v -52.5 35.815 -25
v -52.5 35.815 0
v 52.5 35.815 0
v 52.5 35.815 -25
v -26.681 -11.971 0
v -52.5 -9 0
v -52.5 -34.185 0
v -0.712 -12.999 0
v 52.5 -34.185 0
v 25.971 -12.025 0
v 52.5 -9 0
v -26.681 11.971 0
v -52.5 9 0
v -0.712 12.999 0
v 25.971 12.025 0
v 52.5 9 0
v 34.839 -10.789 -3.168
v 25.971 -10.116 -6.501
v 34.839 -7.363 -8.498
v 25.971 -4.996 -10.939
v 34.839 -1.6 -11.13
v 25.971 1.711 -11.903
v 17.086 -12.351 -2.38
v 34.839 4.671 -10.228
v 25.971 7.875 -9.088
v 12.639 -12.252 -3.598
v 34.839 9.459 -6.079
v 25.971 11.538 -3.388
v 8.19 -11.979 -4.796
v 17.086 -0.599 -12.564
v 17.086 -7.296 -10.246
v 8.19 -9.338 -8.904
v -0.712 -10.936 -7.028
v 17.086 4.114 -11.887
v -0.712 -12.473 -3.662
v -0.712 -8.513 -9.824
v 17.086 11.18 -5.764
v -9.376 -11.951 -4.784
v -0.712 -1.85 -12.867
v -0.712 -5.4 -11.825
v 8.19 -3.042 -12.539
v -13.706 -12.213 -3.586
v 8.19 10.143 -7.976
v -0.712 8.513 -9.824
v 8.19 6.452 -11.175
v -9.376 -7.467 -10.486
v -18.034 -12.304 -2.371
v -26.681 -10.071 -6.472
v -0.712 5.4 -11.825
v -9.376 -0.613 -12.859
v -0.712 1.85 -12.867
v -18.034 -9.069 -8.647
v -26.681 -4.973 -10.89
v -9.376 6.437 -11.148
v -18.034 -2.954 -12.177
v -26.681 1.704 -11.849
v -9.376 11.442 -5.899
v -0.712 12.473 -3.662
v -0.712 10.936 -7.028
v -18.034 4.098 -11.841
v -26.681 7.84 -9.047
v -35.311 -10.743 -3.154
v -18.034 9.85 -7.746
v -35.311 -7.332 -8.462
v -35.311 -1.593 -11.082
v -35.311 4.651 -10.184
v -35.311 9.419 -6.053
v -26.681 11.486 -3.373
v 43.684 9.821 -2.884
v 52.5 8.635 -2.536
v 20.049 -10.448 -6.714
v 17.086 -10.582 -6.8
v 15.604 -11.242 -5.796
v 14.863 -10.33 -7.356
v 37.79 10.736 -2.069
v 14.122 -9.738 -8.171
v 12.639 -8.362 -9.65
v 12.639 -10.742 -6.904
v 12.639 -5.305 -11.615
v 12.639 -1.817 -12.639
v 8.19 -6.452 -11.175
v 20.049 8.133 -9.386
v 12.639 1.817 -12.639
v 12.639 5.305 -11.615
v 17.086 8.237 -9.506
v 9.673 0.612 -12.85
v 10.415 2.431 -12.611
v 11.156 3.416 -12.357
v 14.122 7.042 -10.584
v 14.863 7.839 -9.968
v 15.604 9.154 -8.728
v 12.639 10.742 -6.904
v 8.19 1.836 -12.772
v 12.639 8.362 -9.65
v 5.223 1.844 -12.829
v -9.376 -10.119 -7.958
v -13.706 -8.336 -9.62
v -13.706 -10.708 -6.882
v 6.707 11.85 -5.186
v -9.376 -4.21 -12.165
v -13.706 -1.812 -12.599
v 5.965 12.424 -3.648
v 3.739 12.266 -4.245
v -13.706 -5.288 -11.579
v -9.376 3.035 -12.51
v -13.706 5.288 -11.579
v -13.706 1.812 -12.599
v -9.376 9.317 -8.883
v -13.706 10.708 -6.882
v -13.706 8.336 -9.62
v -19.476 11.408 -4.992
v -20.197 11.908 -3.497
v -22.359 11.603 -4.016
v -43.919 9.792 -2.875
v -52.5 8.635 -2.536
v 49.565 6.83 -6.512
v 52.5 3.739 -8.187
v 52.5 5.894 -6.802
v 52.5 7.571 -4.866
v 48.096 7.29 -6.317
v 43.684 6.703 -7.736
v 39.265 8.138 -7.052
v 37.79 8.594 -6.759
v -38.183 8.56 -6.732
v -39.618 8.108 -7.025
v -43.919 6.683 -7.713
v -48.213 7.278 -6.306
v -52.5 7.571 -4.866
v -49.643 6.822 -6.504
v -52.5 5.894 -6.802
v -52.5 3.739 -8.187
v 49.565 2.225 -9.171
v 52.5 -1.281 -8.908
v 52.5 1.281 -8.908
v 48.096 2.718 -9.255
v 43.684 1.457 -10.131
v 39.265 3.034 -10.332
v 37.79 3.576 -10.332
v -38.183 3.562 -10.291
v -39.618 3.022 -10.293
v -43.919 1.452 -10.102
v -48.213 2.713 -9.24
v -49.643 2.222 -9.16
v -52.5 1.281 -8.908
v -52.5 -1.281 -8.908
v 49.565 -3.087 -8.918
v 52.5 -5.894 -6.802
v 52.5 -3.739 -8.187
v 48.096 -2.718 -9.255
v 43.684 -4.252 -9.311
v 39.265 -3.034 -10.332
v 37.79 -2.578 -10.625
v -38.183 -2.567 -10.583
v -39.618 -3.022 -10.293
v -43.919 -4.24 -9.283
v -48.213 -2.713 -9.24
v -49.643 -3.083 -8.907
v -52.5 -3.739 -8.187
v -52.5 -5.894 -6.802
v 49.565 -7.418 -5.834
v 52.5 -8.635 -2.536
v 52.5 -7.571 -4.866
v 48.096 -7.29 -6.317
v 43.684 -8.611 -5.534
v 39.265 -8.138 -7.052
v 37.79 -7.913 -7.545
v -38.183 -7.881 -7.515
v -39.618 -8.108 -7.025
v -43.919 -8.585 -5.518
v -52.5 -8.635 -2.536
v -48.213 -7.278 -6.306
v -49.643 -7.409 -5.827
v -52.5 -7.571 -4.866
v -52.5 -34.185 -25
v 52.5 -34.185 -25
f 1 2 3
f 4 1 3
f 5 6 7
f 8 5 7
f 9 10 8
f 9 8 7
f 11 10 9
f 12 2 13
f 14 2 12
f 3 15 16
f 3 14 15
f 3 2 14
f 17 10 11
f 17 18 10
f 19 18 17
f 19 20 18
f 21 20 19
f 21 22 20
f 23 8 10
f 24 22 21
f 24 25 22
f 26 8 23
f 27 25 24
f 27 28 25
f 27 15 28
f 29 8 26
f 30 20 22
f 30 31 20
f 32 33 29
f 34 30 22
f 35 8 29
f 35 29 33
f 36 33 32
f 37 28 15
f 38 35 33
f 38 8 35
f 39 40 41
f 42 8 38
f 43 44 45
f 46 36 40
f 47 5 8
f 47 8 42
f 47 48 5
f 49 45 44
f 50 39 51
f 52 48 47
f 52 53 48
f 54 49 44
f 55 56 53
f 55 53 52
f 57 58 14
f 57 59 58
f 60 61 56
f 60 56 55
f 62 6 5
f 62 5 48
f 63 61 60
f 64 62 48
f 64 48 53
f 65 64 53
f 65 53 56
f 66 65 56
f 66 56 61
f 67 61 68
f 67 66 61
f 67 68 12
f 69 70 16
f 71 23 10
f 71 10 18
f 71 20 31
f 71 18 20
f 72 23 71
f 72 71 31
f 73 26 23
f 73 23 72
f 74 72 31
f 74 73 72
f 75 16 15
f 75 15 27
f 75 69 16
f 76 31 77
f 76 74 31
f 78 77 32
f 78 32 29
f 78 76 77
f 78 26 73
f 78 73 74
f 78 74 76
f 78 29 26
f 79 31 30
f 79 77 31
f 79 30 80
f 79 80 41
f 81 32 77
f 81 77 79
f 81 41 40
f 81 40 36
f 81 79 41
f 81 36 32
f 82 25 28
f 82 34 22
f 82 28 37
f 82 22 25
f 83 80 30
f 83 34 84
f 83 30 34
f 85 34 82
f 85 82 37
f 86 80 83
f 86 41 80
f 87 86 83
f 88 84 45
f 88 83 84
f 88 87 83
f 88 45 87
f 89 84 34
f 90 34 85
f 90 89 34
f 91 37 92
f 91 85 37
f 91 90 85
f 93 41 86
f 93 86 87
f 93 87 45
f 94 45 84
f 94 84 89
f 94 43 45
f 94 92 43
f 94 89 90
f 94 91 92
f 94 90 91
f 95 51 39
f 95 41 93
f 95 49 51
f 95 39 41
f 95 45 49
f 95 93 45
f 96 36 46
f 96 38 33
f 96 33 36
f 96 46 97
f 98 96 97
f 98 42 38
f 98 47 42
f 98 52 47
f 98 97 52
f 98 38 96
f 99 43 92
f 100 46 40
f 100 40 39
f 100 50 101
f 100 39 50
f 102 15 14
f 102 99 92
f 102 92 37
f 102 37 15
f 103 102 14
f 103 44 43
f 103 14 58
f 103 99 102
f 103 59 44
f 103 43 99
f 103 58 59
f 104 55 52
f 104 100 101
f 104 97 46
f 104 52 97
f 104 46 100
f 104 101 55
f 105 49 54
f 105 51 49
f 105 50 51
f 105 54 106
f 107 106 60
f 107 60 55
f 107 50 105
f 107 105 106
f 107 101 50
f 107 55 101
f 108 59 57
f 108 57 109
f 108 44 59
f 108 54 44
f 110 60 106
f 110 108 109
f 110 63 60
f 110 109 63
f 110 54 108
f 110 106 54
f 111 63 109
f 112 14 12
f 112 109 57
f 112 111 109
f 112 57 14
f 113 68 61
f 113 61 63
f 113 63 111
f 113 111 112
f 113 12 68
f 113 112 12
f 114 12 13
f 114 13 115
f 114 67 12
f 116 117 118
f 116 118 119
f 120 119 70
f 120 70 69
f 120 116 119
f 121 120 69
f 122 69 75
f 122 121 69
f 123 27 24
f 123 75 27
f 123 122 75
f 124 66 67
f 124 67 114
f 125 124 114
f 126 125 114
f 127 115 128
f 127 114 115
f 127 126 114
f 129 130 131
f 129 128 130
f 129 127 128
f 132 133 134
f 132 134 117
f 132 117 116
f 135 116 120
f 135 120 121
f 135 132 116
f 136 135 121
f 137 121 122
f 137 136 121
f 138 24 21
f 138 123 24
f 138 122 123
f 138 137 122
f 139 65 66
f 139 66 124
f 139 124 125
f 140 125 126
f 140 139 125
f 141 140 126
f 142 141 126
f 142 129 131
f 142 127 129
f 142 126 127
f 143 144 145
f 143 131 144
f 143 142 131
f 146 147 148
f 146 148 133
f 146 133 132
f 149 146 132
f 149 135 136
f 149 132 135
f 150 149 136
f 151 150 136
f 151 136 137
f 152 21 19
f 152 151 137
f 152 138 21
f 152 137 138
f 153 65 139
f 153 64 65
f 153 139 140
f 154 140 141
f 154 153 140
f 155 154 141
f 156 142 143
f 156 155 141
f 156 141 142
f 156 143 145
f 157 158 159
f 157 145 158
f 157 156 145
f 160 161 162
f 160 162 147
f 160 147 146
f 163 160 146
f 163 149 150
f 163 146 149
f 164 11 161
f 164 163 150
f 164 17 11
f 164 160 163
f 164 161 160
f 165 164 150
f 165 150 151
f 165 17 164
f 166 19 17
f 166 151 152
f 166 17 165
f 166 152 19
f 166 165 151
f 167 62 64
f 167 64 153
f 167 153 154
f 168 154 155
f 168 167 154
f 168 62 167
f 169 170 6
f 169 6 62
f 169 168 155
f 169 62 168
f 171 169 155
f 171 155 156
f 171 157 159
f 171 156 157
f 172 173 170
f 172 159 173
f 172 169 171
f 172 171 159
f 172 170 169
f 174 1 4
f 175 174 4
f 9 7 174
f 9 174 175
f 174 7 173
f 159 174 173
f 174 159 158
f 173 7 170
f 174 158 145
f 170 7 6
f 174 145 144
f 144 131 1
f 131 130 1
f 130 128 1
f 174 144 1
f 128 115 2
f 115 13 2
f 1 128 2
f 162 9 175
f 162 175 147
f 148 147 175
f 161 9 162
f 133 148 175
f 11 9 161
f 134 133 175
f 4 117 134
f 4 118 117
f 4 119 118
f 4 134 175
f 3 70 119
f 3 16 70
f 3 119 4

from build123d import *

# Parameters (mm, degrees)
F1_W     = 105
F1_H     = 70
F2_DEPTH = 25
F4_ANGLE = -180


with BuildPart() as f2:
    # F1 (on Top) → F2 (new body)
    with BuildSketch(Plane.XY):
        with Locations((0, 0.815216)):
            Rectangle(F1_W, F1_H)
    extrude(amount=-F2_DEPTH)

    # F0 (on Front) → F3 (revolve, cut)
    with BuildSketch(Plane.XZ):
        with BuildLine():
            Line((-52.5, 9), (-52.5, 0))
            Line((-52.5, 0), (52.5, 0))
            Line((52.5, 0), (52.5, 9))
            ThreePointArc((52.5, 9), (0, 13), (-52.5, 9))
        make_face()
    revolve(axis=Axis((4.963639, 0, 0), (1, 0, 0)), mode=Mode.SUBTRACT)


with BuildPart() as f4_1:
    # F4: copy of F2
    add(f2.part.rotate(Axis((52.5, 0, 0), (1, 0, 0)), F4_ANGLE))


solid = f2.part
